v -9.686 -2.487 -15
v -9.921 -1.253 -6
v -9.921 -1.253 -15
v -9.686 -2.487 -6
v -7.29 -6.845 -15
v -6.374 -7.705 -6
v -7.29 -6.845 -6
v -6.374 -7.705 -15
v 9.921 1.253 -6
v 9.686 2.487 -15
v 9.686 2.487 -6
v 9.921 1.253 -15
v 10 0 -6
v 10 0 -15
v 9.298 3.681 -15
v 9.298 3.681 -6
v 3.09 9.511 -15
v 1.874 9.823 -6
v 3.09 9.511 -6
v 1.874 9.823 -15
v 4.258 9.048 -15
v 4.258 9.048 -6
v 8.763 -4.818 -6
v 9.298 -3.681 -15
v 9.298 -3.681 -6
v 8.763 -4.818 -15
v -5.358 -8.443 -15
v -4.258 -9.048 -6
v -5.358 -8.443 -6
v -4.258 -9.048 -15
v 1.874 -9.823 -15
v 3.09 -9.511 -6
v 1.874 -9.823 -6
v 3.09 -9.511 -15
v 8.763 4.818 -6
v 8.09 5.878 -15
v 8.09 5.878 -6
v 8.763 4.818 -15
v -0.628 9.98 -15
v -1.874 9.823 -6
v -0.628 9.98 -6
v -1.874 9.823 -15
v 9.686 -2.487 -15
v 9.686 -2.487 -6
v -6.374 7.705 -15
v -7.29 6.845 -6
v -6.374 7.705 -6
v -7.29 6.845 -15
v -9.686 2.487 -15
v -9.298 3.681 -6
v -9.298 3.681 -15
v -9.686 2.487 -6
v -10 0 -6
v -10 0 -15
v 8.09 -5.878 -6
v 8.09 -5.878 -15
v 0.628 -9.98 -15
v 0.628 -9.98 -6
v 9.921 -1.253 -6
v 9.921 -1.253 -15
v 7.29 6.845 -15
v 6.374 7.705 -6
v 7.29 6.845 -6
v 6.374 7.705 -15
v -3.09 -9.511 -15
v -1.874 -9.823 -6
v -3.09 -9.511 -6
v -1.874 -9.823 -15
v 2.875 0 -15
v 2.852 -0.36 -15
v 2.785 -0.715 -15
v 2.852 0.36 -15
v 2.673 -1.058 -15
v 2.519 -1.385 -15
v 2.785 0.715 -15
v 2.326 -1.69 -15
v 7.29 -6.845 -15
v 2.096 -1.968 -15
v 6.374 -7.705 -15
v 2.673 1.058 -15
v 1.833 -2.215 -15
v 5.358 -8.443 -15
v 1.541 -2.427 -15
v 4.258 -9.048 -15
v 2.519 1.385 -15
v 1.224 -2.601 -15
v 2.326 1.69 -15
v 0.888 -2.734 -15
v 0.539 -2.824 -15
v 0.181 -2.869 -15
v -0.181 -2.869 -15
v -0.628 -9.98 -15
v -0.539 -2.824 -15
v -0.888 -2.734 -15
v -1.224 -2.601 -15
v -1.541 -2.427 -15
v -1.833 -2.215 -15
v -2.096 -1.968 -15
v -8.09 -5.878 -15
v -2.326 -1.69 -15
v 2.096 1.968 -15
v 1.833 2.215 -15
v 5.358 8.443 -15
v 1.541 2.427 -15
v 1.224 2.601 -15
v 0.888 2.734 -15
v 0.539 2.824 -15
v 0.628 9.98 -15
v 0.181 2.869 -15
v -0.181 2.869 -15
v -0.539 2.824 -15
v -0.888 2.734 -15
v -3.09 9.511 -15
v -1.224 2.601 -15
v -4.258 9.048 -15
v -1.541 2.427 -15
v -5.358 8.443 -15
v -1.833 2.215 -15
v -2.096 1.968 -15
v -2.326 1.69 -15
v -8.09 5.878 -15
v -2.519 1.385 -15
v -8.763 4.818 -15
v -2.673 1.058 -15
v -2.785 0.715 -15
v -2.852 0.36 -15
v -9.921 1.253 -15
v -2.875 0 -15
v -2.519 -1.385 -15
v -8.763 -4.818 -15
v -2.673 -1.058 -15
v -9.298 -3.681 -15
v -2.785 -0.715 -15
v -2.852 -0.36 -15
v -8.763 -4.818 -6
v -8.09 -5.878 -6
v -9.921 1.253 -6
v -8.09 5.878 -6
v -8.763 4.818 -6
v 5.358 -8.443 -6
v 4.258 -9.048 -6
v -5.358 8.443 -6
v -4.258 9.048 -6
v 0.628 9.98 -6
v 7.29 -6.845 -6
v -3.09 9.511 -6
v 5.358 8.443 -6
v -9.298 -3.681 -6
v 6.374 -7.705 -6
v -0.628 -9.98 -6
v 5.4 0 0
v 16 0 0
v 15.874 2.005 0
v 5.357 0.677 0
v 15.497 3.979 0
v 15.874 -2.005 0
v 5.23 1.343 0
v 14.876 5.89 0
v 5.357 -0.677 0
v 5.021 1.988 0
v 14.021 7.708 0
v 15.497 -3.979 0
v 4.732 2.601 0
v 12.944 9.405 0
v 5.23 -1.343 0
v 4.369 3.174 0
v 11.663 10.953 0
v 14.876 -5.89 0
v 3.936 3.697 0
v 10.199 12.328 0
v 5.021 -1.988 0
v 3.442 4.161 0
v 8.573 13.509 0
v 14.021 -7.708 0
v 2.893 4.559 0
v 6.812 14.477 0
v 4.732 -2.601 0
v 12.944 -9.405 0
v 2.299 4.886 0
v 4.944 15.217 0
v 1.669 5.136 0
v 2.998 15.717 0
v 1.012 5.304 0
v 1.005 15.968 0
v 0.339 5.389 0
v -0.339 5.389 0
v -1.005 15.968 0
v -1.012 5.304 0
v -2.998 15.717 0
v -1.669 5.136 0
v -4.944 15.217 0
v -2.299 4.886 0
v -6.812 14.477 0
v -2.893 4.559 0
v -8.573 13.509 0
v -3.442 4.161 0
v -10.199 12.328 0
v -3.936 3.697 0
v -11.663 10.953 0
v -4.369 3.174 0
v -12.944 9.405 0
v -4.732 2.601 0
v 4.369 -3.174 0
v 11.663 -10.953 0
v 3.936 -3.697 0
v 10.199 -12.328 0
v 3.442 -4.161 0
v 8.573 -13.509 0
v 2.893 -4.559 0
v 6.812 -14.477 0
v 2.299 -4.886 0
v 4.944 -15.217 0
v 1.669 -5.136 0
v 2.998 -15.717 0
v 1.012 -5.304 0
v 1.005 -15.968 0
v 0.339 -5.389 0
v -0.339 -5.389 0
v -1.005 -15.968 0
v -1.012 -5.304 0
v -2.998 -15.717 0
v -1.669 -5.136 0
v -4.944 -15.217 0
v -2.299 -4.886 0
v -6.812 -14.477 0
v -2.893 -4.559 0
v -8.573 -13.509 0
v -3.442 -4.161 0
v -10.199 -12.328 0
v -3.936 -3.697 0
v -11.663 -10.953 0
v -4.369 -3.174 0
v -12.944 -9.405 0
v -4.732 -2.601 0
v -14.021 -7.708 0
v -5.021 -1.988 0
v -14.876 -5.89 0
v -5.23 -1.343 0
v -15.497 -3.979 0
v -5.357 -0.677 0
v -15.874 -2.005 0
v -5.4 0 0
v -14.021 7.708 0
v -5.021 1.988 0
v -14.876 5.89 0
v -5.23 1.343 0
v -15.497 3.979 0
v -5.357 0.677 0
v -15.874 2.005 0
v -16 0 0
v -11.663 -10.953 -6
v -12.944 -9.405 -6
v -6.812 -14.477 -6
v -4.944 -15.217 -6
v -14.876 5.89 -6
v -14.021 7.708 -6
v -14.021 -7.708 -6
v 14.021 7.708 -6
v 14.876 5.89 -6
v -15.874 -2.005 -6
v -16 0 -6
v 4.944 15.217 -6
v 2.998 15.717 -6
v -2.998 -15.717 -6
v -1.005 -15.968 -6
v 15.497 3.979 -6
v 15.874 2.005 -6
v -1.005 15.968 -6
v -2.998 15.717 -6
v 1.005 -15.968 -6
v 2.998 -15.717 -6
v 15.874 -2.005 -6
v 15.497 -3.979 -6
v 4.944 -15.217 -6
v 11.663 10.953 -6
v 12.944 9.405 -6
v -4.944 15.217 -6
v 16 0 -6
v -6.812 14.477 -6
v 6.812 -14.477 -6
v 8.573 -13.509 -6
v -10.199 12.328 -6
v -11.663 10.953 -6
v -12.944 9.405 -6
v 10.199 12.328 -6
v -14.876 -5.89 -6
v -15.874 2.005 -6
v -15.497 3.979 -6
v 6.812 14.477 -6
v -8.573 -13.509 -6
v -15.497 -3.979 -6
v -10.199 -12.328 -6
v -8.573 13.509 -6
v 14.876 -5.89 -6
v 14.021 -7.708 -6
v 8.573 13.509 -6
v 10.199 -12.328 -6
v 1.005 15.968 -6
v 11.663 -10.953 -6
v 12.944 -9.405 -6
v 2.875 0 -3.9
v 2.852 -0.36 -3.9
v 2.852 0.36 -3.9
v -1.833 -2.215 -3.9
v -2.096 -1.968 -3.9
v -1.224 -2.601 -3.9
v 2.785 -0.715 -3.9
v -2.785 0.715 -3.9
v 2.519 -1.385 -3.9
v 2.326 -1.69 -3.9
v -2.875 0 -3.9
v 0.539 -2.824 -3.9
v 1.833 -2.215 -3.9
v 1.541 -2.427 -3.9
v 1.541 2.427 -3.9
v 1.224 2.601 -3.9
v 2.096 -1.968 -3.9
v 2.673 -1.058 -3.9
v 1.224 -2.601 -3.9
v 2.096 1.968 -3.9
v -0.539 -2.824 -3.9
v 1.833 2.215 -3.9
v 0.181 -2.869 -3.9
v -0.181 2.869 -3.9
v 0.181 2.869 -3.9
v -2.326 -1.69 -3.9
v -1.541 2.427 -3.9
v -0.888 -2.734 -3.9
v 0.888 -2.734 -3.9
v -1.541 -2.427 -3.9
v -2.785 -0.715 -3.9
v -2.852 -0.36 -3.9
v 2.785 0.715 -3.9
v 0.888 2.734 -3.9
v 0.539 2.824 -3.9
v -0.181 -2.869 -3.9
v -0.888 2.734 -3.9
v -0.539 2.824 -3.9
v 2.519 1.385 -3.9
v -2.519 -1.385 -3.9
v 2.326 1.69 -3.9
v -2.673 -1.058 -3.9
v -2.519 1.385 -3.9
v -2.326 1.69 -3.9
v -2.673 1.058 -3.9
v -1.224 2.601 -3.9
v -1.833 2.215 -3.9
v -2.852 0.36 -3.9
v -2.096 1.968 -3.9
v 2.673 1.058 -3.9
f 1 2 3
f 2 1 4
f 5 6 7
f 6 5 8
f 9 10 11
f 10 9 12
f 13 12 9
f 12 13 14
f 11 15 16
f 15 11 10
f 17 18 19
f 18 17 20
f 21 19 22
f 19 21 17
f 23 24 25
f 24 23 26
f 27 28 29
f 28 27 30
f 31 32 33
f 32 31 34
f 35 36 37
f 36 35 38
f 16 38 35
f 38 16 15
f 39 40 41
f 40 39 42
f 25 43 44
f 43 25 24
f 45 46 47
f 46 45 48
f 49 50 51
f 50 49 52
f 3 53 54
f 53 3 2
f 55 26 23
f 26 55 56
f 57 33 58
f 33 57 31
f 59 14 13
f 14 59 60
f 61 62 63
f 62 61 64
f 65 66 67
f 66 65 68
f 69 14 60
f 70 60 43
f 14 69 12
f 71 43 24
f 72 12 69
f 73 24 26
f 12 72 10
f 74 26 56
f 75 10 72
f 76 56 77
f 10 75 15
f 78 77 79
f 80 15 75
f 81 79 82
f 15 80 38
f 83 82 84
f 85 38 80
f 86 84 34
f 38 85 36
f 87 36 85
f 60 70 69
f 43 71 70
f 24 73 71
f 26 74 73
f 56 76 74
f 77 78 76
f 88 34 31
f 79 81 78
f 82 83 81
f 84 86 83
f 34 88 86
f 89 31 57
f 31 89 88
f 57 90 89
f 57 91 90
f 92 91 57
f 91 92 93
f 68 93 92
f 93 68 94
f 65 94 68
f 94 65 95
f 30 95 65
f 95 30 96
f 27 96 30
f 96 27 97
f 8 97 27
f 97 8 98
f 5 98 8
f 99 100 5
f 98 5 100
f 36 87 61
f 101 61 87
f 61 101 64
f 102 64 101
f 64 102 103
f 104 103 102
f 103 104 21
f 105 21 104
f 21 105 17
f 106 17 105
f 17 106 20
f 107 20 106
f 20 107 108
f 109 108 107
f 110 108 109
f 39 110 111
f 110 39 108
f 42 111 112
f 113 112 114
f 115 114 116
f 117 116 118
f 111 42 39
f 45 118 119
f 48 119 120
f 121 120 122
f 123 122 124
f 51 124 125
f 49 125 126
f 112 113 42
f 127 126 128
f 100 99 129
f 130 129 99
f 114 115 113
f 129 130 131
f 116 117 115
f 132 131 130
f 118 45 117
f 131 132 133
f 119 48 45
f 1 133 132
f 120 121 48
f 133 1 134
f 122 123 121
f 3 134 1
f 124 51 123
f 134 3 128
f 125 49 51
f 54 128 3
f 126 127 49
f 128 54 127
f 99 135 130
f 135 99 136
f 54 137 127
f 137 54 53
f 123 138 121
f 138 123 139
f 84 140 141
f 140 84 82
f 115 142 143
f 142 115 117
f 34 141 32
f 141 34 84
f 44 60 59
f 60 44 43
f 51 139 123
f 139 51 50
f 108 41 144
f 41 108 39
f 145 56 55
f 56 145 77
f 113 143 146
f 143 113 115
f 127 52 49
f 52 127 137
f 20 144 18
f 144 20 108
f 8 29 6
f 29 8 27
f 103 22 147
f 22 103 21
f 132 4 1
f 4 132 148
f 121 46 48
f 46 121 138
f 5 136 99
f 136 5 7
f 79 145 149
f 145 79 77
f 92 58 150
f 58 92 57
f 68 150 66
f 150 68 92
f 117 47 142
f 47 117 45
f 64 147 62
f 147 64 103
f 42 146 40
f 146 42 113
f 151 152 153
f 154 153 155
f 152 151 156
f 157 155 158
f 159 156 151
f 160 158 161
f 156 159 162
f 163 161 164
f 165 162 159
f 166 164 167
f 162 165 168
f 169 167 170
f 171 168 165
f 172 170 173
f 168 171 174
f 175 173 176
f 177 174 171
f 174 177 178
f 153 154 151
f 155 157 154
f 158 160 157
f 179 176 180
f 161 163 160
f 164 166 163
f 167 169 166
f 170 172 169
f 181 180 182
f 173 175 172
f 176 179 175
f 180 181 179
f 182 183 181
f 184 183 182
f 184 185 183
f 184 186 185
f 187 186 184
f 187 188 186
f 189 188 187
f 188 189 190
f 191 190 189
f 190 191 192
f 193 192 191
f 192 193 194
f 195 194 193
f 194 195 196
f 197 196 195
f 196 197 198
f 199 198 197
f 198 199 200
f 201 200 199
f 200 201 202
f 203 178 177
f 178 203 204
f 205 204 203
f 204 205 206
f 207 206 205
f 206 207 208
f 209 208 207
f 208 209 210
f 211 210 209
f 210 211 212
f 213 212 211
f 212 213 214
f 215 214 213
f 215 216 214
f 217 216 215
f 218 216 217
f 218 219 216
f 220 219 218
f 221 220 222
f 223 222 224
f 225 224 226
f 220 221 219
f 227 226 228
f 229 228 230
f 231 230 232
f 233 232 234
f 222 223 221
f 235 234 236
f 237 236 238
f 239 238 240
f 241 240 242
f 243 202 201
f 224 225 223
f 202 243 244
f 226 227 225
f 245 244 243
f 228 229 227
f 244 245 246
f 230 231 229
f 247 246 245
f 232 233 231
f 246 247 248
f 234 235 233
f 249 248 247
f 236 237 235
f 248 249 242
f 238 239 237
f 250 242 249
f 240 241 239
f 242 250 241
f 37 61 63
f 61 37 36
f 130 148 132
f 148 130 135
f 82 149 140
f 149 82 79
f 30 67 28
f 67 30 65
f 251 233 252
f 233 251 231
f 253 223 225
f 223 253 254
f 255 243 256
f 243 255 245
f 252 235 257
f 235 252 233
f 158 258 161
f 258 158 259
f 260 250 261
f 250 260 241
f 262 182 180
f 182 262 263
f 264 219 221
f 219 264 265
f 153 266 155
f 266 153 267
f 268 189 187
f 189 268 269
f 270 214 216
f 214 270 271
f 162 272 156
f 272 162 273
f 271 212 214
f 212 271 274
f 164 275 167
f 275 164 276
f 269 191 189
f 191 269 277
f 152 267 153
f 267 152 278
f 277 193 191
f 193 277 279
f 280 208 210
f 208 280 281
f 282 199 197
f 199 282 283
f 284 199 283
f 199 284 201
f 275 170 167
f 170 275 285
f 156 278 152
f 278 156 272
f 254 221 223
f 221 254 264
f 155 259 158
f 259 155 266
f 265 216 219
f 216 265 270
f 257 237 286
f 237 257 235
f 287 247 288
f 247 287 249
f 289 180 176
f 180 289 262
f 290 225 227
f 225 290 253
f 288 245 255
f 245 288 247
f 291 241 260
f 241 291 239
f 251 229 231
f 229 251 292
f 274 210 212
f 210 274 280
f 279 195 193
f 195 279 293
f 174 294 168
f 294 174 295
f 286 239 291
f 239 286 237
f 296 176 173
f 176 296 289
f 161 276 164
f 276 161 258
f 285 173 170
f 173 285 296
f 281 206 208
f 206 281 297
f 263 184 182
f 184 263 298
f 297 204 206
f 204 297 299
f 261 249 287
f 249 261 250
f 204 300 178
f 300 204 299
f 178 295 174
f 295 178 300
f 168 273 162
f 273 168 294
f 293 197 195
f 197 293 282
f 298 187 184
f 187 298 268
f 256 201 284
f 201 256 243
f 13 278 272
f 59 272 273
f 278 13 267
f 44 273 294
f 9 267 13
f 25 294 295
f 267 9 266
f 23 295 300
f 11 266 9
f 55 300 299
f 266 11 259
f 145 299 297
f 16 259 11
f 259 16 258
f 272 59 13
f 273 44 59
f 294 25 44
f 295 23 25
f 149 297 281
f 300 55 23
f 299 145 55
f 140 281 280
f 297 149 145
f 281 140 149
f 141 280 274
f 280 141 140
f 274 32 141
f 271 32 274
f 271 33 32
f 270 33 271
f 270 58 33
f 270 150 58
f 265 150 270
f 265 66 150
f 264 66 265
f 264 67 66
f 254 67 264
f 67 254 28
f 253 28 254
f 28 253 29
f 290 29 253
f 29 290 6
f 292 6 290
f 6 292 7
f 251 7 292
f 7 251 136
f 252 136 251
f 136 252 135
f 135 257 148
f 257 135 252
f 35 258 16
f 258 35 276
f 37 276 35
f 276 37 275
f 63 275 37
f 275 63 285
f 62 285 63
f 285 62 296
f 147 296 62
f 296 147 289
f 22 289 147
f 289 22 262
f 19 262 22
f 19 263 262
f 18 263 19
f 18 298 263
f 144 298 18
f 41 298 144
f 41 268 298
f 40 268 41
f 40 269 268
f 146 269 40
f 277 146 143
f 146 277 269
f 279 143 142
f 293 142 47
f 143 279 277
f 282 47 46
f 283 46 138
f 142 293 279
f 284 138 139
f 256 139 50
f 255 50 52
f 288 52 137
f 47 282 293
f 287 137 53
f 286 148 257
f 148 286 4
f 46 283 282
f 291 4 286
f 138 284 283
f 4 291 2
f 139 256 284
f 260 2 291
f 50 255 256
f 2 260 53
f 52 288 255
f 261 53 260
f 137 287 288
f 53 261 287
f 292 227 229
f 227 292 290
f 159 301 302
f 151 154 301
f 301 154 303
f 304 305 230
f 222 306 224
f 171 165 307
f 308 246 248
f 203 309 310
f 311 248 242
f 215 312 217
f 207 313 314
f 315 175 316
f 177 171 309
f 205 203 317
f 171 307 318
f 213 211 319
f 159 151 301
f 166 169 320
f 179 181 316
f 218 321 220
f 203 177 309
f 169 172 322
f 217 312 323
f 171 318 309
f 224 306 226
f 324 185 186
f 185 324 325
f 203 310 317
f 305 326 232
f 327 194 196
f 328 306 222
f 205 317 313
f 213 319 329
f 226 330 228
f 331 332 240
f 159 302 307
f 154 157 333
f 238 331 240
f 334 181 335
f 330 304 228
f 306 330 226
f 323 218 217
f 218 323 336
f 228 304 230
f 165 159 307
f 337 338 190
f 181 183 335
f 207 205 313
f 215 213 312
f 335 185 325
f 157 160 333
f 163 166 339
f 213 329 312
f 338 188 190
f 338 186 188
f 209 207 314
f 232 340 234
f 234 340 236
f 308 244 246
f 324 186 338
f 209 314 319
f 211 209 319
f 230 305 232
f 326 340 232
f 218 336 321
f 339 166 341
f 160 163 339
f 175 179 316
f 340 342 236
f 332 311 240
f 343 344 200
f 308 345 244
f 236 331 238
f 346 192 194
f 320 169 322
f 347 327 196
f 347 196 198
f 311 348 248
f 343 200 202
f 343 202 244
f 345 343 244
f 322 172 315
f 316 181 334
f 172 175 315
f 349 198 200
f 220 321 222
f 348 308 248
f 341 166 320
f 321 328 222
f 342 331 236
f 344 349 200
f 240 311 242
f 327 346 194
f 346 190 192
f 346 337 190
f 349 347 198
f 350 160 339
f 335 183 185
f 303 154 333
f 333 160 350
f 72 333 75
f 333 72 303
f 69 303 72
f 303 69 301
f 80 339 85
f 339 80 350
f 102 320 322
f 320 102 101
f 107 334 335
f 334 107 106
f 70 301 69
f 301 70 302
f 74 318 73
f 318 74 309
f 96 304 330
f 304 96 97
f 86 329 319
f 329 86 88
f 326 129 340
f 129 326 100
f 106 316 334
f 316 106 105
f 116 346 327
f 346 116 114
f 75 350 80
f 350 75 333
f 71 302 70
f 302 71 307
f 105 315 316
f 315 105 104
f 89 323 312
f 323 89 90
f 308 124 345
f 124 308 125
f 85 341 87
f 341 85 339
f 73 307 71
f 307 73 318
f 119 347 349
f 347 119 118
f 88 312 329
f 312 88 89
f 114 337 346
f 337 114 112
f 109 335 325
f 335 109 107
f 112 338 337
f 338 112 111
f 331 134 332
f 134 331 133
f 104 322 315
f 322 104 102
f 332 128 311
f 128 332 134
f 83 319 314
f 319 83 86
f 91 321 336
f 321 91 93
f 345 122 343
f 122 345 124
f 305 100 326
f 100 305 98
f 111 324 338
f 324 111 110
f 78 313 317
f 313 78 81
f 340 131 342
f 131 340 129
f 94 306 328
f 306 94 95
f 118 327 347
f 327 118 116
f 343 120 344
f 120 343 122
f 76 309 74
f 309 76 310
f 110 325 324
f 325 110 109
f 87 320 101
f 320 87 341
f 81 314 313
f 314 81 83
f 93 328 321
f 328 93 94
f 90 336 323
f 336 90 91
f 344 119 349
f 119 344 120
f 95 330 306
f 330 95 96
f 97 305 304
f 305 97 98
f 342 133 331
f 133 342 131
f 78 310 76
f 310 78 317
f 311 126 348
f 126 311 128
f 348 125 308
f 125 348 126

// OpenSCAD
$fn = 50;


difference() {
	union() {
		translate(v = [0, 0, -15.0000000000]) {
			cylinder(h = 15, r = 10.0000000000);
		}
		translate(v = [0, 0, -6.0000000000]) {
			cylinder(h = 6, r = 16.0000000000);
		}
	}
	union() {
		translate(v = [0, 0, 0]) {
			rotate(a = [0, 0, 0]) {
				difference() {
					union() {
						#translate(v = [0, 0, -15.0000000000]) {
							cylinder(h = 15, r = 2.6000000000);
						}
						#translate(v = [0, 0, -3.9000000000]) {
							cylinder(h = 3.9000000000, r1 = 2.8750000000, r2 = 5.4000000000);
						}
						#translate(v = [0, 0, -15.0000000000]) {
							cylinder(h = 15, r = 2.8750000000);
						}
						#translate(v = [0, 0, -15.0000000000]) {
							cylinder(h = 15, r = 2.6000000000);
						}
					}
					union();
				}
			}
		}
	}
}
